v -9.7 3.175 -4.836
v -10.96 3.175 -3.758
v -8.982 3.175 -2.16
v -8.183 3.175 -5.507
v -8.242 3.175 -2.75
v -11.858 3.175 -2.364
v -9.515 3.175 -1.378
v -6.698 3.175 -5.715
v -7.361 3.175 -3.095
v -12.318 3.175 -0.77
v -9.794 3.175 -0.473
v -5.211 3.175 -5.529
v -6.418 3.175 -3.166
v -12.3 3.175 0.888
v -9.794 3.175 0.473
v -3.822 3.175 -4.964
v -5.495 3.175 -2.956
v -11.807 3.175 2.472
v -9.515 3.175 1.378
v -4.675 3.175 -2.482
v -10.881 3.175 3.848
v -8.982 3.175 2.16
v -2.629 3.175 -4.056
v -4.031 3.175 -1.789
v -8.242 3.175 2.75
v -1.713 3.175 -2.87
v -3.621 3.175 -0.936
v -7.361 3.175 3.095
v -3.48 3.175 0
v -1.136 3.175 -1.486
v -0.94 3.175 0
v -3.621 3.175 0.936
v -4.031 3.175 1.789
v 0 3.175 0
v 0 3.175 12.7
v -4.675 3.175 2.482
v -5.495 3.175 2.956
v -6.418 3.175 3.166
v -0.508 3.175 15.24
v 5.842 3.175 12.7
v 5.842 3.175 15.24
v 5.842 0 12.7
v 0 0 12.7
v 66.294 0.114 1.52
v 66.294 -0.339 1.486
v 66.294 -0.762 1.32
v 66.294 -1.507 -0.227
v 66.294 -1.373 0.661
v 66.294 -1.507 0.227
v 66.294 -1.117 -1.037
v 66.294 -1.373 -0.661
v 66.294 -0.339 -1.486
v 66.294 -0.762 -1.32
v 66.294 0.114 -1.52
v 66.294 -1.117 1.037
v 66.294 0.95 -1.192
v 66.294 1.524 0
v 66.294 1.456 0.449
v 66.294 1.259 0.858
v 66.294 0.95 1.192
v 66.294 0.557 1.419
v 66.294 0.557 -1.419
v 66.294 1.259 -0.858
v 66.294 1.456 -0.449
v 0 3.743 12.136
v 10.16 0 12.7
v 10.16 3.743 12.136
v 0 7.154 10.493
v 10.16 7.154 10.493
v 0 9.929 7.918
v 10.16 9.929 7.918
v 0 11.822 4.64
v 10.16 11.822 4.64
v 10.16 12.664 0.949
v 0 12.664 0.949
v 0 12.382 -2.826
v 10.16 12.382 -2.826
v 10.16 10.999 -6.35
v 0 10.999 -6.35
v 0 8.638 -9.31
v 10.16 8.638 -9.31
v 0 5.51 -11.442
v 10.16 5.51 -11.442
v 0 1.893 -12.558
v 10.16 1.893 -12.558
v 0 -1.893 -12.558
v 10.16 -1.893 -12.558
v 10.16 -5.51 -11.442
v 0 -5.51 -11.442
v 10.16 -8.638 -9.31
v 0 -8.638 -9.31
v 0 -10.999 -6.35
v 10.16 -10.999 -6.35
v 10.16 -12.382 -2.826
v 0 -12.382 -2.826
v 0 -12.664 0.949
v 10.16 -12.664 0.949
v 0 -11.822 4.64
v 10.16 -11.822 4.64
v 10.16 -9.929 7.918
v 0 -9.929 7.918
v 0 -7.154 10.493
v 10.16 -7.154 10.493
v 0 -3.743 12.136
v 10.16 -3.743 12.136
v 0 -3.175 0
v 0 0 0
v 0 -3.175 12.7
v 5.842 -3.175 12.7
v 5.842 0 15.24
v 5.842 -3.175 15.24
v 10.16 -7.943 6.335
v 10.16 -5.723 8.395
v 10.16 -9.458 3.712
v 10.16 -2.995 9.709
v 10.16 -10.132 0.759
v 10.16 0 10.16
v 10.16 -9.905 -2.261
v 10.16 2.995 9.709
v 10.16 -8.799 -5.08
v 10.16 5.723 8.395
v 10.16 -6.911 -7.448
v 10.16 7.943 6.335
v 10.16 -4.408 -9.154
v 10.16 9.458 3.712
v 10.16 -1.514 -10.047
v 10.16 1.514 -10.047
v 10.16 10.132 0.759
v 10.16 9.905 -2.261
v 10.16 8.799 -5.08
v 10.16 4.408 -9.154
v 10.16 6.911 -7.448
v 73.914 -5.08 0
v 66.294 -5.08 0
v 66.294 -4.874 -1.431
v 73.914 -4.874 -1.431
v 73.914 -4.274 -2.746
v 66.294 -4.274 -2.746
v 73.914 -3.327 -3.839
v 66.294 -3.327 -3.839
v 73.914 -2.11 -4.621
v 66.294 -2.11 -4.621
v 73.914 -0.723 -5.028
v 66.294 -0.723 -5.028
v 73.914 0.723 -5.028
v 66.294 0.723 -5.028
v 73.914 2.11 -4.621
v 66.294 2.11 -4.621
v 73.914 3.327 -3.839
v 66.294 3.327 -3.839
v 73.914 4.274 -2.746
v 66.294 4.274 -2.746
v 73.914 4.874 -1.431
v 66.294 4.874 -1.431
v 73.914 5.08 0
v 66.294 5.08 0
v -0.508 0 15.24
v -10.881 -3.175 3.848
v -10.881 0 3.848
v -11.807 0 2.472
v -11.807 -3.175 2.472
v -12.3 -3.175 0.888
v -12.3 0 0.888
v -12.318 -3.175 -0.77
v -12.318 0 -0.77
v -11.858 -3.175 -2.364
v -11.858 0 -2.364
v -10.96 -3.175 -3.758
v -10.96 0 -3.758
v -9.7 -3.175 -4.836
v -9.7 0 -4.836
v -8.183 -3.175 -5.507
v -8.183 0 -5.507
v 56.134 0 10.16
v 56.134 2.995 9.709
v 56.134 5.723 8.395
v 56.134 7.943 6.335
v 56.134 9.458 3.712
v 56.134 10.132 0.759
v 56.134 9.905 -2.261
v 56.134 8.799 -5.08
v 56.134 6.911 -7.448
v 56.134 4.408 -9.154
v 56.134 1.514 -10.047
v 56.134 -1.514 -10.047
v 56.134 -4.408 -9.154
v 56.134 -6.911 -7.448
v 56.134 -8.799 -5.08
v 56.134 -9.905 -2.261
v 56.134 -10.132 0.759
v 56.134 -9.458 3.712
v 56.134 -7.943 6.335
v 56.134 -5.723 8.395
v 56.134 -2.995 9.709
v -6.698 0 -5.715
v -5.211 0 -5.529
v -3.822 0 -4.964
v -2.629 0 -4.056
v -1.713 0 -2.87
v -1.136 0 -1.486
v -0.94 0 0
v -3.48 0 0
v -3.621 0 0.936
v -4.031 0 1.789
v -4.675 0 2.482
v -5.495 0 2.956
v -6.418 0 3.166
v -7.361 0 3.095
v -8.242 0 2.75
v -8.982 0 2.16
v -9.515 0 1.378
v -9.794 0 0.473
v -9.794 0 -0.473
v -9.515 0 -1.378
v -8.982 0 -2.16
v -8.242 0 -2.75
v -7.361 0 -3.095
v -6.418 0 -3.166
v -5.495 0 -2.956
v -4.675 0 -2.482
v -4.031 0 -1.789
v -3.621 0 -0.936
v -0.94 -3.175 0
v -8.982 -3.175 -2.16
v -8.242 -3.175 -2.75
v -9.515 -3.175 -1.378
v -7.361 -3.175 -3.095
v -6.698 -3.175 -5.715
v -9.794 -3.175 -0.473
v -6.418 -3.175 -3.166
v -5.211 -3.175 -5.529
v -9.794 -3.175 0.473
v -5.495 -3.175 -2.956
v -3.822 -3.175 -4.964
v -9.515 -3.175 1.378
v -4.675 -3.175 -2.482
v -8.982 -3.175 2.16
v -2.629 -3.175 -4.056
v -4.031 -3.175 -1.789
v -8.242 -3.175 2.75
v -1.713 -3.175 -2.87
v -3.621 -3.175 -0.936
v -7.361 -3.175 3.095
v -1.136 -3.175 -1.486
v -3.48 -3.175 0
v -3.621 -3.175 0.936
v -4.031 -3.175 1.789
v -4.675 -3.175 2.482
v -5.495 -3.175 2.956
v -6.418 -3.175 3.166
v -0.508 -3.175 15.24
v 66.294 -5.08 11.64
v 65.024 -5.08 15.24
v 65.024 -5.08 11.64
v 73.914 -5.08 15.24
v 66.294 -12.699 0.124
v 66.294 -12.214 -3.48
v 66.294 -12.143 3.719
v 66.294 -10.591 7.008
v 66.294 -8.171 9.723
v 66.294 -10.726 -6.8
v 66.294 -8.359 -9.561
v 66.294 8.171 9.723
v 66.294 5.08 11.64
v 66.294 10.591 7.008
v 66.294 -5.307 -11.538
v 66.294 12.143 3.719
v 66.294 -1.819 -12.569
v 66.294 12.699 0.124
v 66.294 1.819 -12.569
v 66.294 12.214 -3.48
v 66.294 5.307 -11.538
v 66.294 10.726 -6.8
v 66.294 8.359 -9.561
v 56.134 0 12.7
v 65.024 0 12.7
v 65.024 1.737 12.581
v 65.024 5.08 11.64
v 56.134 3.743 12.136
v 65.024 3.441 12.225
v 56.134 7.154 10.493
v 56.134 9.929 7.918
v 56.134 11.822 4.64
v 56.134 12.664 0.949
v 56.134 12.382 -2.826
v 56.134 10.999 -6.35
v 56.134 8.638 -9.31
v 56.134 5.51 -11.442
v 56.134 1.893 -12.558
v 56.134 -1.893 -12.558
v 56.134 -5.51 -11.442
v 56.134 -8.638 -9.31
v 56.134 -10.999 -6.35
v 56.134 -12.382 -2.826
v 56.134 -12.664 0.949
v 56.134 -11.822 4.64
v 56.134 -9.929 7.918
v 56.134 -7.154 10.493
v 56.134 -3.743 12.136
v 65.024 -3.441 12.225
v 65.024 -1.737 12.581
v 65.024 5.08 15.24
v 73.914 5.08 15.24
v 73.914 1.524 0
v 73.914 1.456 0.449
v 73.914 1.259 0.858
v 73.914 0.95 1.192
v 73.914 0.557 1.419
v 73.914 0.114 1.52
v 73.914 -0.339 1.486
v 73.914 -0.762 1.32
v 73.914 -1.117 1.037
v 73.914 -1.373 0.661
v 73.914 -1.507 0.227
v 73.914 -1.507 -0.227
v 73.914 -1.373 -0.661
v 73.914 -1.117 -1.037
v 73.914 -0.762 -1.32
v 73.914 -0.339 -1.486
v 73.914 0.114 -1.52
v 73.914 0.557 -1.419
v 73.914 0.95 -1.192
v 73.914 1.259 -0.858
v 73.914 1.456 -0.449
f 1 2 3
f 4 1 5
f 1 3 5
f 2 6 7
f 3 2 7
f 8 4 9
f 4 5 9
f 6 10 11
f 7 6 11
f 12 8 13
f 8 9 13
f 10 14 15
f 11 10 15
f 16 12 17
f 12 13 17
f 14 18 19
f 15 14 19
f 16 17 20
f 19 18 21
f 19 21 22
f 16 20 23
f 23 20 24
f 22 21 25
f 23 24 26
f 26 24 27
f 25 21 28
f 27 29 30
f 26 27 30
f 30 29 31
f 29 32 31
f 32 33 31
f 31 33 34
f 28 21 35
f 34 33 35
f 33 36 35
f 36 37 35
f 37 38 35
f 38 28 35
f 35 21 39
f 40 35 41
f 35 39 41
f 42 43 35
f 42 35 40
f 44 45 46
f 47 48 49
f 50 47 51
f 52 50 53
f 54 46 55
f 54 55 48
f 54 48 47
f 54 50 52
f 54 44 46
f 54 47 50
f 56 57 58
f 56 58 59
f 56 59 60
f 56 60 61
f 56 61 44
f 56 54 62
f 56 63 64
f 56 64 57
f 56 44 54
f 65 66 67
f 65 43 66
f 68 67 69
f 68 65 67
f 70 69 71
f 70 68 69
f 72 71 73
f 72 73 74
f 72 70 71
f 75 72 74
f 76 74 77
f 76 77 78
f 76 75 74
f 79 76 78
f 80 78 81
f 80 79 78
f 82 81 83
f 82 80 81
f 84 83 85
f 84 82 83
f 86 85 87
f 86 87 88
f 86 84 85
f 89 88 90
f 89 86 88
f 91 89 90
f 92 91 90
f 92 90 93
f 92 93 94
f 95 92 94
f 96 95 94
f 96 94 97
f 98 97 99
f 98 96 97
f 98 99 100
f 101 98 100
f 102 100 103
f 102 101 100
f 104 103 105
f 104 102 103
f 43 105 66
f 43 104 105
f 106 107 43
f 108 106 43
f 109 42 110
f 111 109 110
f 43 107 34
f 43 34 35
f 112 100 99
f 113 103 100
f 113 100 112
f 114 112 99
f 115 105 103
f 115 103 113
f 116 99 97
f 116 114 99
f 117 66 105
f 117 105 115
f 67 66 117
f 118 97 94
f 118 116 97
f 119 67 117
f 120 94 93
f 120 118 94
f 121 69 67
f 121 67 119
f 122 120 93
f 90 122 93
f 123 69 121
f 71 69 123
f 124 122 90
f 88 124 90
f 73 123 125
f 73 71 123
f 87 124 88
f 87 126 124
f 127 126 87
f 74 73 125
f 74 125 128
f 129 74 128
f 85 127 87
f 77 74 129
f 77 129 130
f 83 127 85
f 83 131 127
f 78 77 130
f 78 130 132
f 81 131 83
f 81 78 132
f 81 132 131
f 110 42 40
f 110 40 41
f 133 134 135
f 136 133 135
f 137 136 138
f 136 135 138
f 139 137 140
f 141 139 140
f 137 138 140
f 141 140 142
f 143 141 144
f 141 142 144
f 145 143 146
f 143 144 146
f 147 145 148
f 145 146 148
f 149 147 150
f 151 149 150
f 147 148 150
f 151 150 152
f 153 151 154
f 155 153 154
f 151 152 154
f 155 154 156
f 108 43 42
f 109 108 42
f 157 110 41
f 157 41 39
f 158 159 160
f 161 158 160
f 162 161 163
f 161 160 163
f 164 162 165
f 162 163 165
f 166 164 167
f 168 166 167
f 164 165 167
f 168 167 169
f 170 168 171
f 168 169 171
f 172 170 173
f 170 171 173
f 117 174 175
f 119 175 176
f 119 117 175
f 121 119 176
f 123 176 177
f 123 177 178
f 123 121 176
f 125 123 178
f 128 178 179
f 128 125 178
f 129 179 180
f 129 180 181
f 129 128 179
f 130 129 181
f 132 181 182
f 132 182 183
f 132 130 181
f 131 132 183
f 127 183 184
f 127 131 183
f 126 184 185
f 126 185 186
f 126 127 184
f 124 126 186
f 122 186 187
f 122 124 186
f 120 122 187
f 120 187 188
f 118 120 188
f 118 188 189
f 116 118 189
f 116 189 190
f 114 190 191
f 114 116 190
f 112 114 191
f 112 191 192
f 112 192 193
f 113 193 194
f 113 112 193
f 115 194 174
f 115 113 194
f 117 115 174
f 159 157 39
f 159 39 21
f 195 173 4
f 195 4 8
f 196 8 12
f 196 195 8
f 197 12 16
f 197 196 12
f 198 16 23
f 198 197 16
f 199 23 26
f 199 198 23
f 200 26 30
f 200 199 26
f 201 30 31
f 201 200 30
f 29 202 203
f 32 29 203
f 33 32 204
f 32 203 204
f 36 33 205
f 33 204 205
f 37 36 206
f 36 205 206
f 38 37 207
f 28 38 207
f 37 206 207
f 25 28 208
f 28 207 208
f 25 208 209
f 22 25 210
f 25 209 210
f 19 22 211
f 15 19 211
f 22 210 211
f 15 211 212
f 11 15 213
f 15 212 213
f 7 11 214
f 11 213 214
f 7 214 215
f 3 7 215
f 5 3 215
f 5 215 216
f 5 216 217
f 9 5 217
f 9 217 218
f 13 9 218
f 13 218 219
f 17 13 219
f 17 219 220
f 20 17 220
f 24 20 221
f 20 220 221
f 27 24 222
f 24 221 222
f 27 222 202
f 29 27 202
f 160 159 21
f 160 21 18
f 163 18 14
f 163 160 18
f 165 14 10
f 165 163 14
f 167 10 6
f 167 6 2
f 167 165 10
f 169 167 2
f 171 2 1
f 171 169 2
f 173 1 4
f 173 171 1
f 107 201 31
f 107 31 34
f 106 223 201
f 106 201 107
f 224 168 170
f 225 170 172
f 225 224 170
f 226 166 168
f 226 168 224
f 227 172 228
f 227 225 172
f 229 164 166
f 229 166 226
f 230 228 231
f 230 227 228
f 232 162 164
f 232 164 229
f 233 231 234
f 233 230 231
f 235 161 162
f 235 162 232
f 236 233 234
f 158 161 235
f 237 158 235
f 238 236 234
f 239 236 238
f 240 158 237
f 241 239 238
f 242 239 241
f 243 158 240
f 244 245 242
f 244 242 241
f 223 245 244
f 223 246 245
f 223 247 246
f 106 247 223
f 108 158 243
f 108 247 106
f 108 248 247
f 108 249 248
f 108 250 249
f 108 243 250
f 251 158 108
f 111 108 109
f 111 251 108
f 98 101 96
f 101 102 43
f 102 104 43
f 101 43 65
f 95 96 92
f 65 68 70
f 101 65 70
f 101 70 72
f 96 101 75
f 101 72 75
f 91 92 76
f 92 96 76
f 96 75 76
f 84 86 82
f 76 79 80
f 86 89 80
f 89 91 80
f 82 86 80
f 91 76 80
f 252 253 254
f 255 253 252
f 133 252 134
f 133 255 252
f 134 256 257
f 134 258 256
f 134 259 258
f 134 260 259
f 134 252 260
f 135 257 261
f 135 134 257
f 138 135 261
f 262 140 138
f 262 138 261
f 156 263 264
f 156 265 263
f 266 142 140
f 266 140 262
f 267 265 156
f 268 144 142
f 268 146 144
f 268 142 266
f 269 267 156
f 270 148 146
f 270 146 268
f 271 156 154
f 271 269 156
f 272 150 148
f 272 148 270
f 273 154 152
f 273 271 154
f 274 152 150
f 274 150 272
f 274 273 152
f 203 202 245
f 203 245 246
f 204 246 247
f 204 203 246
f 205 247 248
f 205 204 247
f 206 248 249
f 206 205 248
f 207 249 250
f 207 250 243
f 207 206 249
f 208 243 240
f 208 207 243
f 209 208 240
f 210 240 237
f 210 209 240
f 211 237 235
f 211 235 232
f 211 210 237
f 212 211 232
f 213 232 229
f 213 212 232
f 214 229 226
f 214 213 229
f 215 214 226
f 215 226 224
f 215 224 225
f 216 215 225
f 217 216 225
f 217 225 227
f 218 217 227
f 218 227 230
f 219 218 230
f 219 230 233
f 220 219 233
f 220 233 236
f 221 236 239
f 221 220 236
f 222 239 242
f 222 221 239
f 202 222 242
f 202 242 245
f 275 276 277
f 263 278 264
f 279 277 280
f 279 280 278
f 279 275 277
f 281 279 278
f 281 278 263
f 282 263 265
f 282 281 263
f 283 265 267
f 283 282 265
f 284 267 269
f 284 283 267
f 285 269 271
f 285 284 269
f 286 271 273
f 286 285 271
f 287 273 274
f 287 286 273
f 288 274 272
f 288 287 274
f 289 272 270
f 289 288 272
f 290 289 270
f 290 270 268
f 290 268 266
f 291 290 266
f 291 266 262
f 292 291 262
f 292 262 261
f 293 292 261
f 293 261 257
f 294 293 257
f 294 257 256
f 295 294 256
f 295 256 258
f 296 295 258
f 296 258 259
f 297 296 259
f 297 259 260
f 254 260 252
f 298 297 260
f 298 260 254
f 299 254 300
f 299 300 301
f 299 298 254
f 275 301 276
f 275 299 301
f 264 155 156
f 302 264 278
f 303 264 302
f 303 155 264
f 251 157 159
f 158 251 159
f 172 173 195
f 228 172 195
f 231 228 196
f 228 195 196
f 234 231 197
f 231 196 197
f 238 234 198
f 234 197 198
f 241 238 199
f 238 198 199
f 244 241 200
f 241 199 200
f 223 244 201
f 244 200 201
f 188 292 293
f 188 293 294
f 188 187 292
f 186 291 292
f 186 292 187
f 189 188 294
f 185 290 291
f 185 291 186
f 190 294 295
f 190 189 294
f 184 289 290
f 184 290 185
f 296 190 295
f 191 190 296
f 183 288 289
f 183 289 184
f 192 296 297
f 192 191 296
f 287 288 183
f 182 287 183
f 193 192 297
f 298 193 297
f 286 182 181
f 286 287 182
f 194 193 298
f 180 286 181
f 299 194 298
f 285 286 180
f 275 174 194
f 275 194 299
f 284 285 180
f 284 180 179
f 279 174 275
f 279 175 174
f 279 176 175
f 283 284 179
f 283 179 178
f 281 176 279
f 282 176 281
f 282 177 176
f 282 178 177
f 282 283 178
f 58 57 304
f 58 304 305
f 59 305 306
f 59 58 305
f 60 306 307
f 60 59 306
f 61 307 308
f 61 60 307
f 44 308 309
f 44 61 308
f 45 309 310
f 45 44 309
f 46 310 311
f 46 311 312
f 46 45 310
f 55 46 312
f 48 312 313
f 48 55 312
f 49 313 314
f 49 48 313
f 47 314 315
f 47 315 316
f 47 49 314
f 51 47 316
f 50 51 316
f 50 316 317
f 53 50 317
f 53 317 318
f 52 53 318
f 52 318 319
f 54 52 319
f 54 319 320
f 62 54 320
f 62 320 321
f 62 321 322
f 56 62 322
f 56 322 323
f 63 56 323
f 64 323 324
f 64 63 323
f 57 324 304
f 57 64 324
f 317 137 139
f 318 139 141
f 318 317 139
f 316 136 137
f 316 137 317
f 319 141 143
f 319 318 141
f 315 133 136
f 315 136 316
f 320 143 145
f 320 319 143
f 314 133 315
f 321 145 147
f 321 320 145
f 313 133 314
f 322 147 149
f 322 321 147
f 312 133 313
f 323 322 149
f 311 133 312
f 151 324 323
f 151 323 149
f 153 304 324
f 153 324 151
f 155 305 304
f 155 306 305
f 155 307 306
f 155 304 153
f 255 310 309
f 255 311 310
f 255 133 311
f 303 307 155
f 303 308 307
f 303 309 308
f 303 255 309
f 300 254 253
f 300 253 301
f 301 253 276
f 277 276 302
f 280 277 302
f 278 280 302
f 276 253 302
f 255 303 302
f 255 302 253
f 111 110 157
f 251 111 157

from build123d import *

# Parameters (mm, degrees)
F0_W          = 5.842
F0_H          = 12.7
F0_R          = 3.175
F2_DEPTH      = 3.175
F3_R          = 1.524
F4_DEPTH      = 7.62
F4_DEPTH_BACK = 1.27


with BuildPart() as f1:
    # F0 (on Front) → F1 (revolve)
    with BuildSketch(Plane.XZ):
        Polygon((5.842, 12.7), (5.842, 0), (66.294, 0), (66.294, 12.7), (56.134, 12.7), (56.134, 10.16), (10.16, 10.16), (10.16, 12.7), align=None)
        with Locations((2.921, 6.35)):
            Rectangle(F0_W, F0_H)
    revolve(axis=Axis((33.147, 0, 0), (-1, 0, 0)))

    # F3 (on face) → F4 (join, two sides)
    with BuildSketch(Plane.YZ.offset(66.294)) as f4_sk:
        with BuildLine():
            ThreePointArc((-5.08, 0), (0, 5.08), (5.08, 0))
            Line((5.08, 0), (5.08, 11.6397422652))
            ThreePointArc((5.08, 11.6397422652), (0, 12.7), (-5.08, 11.6397422652))
            Line((-5.08, 11.6397422652), (-5.08, 0))
        make_face()
        with BuildLine():
            ThreePointArc((-5.08, 0), (0, -5.08), (5.08, 0))
            ThreePointArc((5.08, 0), (0, 5.08), (-5.08, 0))
        make_face()
        Circle(F3_R, mode=Mode.SUBTRACT)
        with BuildLine():
            ThreePointArc((-5.08, 11.6397422652), (0, 12.7), (5.08, 11.6397422652))
            Line((5.08, 11.6397422652), (5.08, 15.24))
            Line((5.08, 15.24), (-5.08, 15.24))
            Line((-5.08, 15.24), (-5.08, 11.6397422652))
        make_face()
    extrude(amount=F4_DEPTH)
    extrude(f4_sk.sketch, amount=-F4_DEPTH_BACK)


with BuildPart() as f2:
    # F0 (on Front) → F2 (new body, symmetric)
    with BuildSketch(Plane.XZ):
        with BuildLine():
            Line((-0.9398, 0), (0, 0))
            Line((0, 0), (0, 12.7))
            Line((0, 12.7), (5.842, 12.7))
            Line((5.842, 12.7), (5.842, 15.24))
            Line((5.842, 15.24), (-0.508, 15.24))
            Line((-0.508, 15.24), (-10.8806298187, 3.8475430269))
            ThreePointArc((-10.8806298187, 3.8475430269), (-4.5919612295, 5.3297205562), (-0.9398, 0))
        make_face()
        with BuildLine():
            ThreePointArc((-8.1826630726, -5.5069827884), (-3.1957909266, -4.5493385486), (-0.9398, 0))
            ThreePointArc((-0.9398, 0), (-4.5919612295, 5.3297205562), (-10.8806298187, 3.8475430269))
            ThreePointArc((-10.8806298187, 3.8475430269), (-12.1459778134, -1.5837270034), (-8.1826630726, -5.5069827884))
        make_face()
        with Locations((-6.6548, 0)):
            Circle(F0_R, mode=Mode.SUBTRACT)
    extrude(amount=F2_DEPTH, both=True)


solid = Compound([f1.part, f2.part])
